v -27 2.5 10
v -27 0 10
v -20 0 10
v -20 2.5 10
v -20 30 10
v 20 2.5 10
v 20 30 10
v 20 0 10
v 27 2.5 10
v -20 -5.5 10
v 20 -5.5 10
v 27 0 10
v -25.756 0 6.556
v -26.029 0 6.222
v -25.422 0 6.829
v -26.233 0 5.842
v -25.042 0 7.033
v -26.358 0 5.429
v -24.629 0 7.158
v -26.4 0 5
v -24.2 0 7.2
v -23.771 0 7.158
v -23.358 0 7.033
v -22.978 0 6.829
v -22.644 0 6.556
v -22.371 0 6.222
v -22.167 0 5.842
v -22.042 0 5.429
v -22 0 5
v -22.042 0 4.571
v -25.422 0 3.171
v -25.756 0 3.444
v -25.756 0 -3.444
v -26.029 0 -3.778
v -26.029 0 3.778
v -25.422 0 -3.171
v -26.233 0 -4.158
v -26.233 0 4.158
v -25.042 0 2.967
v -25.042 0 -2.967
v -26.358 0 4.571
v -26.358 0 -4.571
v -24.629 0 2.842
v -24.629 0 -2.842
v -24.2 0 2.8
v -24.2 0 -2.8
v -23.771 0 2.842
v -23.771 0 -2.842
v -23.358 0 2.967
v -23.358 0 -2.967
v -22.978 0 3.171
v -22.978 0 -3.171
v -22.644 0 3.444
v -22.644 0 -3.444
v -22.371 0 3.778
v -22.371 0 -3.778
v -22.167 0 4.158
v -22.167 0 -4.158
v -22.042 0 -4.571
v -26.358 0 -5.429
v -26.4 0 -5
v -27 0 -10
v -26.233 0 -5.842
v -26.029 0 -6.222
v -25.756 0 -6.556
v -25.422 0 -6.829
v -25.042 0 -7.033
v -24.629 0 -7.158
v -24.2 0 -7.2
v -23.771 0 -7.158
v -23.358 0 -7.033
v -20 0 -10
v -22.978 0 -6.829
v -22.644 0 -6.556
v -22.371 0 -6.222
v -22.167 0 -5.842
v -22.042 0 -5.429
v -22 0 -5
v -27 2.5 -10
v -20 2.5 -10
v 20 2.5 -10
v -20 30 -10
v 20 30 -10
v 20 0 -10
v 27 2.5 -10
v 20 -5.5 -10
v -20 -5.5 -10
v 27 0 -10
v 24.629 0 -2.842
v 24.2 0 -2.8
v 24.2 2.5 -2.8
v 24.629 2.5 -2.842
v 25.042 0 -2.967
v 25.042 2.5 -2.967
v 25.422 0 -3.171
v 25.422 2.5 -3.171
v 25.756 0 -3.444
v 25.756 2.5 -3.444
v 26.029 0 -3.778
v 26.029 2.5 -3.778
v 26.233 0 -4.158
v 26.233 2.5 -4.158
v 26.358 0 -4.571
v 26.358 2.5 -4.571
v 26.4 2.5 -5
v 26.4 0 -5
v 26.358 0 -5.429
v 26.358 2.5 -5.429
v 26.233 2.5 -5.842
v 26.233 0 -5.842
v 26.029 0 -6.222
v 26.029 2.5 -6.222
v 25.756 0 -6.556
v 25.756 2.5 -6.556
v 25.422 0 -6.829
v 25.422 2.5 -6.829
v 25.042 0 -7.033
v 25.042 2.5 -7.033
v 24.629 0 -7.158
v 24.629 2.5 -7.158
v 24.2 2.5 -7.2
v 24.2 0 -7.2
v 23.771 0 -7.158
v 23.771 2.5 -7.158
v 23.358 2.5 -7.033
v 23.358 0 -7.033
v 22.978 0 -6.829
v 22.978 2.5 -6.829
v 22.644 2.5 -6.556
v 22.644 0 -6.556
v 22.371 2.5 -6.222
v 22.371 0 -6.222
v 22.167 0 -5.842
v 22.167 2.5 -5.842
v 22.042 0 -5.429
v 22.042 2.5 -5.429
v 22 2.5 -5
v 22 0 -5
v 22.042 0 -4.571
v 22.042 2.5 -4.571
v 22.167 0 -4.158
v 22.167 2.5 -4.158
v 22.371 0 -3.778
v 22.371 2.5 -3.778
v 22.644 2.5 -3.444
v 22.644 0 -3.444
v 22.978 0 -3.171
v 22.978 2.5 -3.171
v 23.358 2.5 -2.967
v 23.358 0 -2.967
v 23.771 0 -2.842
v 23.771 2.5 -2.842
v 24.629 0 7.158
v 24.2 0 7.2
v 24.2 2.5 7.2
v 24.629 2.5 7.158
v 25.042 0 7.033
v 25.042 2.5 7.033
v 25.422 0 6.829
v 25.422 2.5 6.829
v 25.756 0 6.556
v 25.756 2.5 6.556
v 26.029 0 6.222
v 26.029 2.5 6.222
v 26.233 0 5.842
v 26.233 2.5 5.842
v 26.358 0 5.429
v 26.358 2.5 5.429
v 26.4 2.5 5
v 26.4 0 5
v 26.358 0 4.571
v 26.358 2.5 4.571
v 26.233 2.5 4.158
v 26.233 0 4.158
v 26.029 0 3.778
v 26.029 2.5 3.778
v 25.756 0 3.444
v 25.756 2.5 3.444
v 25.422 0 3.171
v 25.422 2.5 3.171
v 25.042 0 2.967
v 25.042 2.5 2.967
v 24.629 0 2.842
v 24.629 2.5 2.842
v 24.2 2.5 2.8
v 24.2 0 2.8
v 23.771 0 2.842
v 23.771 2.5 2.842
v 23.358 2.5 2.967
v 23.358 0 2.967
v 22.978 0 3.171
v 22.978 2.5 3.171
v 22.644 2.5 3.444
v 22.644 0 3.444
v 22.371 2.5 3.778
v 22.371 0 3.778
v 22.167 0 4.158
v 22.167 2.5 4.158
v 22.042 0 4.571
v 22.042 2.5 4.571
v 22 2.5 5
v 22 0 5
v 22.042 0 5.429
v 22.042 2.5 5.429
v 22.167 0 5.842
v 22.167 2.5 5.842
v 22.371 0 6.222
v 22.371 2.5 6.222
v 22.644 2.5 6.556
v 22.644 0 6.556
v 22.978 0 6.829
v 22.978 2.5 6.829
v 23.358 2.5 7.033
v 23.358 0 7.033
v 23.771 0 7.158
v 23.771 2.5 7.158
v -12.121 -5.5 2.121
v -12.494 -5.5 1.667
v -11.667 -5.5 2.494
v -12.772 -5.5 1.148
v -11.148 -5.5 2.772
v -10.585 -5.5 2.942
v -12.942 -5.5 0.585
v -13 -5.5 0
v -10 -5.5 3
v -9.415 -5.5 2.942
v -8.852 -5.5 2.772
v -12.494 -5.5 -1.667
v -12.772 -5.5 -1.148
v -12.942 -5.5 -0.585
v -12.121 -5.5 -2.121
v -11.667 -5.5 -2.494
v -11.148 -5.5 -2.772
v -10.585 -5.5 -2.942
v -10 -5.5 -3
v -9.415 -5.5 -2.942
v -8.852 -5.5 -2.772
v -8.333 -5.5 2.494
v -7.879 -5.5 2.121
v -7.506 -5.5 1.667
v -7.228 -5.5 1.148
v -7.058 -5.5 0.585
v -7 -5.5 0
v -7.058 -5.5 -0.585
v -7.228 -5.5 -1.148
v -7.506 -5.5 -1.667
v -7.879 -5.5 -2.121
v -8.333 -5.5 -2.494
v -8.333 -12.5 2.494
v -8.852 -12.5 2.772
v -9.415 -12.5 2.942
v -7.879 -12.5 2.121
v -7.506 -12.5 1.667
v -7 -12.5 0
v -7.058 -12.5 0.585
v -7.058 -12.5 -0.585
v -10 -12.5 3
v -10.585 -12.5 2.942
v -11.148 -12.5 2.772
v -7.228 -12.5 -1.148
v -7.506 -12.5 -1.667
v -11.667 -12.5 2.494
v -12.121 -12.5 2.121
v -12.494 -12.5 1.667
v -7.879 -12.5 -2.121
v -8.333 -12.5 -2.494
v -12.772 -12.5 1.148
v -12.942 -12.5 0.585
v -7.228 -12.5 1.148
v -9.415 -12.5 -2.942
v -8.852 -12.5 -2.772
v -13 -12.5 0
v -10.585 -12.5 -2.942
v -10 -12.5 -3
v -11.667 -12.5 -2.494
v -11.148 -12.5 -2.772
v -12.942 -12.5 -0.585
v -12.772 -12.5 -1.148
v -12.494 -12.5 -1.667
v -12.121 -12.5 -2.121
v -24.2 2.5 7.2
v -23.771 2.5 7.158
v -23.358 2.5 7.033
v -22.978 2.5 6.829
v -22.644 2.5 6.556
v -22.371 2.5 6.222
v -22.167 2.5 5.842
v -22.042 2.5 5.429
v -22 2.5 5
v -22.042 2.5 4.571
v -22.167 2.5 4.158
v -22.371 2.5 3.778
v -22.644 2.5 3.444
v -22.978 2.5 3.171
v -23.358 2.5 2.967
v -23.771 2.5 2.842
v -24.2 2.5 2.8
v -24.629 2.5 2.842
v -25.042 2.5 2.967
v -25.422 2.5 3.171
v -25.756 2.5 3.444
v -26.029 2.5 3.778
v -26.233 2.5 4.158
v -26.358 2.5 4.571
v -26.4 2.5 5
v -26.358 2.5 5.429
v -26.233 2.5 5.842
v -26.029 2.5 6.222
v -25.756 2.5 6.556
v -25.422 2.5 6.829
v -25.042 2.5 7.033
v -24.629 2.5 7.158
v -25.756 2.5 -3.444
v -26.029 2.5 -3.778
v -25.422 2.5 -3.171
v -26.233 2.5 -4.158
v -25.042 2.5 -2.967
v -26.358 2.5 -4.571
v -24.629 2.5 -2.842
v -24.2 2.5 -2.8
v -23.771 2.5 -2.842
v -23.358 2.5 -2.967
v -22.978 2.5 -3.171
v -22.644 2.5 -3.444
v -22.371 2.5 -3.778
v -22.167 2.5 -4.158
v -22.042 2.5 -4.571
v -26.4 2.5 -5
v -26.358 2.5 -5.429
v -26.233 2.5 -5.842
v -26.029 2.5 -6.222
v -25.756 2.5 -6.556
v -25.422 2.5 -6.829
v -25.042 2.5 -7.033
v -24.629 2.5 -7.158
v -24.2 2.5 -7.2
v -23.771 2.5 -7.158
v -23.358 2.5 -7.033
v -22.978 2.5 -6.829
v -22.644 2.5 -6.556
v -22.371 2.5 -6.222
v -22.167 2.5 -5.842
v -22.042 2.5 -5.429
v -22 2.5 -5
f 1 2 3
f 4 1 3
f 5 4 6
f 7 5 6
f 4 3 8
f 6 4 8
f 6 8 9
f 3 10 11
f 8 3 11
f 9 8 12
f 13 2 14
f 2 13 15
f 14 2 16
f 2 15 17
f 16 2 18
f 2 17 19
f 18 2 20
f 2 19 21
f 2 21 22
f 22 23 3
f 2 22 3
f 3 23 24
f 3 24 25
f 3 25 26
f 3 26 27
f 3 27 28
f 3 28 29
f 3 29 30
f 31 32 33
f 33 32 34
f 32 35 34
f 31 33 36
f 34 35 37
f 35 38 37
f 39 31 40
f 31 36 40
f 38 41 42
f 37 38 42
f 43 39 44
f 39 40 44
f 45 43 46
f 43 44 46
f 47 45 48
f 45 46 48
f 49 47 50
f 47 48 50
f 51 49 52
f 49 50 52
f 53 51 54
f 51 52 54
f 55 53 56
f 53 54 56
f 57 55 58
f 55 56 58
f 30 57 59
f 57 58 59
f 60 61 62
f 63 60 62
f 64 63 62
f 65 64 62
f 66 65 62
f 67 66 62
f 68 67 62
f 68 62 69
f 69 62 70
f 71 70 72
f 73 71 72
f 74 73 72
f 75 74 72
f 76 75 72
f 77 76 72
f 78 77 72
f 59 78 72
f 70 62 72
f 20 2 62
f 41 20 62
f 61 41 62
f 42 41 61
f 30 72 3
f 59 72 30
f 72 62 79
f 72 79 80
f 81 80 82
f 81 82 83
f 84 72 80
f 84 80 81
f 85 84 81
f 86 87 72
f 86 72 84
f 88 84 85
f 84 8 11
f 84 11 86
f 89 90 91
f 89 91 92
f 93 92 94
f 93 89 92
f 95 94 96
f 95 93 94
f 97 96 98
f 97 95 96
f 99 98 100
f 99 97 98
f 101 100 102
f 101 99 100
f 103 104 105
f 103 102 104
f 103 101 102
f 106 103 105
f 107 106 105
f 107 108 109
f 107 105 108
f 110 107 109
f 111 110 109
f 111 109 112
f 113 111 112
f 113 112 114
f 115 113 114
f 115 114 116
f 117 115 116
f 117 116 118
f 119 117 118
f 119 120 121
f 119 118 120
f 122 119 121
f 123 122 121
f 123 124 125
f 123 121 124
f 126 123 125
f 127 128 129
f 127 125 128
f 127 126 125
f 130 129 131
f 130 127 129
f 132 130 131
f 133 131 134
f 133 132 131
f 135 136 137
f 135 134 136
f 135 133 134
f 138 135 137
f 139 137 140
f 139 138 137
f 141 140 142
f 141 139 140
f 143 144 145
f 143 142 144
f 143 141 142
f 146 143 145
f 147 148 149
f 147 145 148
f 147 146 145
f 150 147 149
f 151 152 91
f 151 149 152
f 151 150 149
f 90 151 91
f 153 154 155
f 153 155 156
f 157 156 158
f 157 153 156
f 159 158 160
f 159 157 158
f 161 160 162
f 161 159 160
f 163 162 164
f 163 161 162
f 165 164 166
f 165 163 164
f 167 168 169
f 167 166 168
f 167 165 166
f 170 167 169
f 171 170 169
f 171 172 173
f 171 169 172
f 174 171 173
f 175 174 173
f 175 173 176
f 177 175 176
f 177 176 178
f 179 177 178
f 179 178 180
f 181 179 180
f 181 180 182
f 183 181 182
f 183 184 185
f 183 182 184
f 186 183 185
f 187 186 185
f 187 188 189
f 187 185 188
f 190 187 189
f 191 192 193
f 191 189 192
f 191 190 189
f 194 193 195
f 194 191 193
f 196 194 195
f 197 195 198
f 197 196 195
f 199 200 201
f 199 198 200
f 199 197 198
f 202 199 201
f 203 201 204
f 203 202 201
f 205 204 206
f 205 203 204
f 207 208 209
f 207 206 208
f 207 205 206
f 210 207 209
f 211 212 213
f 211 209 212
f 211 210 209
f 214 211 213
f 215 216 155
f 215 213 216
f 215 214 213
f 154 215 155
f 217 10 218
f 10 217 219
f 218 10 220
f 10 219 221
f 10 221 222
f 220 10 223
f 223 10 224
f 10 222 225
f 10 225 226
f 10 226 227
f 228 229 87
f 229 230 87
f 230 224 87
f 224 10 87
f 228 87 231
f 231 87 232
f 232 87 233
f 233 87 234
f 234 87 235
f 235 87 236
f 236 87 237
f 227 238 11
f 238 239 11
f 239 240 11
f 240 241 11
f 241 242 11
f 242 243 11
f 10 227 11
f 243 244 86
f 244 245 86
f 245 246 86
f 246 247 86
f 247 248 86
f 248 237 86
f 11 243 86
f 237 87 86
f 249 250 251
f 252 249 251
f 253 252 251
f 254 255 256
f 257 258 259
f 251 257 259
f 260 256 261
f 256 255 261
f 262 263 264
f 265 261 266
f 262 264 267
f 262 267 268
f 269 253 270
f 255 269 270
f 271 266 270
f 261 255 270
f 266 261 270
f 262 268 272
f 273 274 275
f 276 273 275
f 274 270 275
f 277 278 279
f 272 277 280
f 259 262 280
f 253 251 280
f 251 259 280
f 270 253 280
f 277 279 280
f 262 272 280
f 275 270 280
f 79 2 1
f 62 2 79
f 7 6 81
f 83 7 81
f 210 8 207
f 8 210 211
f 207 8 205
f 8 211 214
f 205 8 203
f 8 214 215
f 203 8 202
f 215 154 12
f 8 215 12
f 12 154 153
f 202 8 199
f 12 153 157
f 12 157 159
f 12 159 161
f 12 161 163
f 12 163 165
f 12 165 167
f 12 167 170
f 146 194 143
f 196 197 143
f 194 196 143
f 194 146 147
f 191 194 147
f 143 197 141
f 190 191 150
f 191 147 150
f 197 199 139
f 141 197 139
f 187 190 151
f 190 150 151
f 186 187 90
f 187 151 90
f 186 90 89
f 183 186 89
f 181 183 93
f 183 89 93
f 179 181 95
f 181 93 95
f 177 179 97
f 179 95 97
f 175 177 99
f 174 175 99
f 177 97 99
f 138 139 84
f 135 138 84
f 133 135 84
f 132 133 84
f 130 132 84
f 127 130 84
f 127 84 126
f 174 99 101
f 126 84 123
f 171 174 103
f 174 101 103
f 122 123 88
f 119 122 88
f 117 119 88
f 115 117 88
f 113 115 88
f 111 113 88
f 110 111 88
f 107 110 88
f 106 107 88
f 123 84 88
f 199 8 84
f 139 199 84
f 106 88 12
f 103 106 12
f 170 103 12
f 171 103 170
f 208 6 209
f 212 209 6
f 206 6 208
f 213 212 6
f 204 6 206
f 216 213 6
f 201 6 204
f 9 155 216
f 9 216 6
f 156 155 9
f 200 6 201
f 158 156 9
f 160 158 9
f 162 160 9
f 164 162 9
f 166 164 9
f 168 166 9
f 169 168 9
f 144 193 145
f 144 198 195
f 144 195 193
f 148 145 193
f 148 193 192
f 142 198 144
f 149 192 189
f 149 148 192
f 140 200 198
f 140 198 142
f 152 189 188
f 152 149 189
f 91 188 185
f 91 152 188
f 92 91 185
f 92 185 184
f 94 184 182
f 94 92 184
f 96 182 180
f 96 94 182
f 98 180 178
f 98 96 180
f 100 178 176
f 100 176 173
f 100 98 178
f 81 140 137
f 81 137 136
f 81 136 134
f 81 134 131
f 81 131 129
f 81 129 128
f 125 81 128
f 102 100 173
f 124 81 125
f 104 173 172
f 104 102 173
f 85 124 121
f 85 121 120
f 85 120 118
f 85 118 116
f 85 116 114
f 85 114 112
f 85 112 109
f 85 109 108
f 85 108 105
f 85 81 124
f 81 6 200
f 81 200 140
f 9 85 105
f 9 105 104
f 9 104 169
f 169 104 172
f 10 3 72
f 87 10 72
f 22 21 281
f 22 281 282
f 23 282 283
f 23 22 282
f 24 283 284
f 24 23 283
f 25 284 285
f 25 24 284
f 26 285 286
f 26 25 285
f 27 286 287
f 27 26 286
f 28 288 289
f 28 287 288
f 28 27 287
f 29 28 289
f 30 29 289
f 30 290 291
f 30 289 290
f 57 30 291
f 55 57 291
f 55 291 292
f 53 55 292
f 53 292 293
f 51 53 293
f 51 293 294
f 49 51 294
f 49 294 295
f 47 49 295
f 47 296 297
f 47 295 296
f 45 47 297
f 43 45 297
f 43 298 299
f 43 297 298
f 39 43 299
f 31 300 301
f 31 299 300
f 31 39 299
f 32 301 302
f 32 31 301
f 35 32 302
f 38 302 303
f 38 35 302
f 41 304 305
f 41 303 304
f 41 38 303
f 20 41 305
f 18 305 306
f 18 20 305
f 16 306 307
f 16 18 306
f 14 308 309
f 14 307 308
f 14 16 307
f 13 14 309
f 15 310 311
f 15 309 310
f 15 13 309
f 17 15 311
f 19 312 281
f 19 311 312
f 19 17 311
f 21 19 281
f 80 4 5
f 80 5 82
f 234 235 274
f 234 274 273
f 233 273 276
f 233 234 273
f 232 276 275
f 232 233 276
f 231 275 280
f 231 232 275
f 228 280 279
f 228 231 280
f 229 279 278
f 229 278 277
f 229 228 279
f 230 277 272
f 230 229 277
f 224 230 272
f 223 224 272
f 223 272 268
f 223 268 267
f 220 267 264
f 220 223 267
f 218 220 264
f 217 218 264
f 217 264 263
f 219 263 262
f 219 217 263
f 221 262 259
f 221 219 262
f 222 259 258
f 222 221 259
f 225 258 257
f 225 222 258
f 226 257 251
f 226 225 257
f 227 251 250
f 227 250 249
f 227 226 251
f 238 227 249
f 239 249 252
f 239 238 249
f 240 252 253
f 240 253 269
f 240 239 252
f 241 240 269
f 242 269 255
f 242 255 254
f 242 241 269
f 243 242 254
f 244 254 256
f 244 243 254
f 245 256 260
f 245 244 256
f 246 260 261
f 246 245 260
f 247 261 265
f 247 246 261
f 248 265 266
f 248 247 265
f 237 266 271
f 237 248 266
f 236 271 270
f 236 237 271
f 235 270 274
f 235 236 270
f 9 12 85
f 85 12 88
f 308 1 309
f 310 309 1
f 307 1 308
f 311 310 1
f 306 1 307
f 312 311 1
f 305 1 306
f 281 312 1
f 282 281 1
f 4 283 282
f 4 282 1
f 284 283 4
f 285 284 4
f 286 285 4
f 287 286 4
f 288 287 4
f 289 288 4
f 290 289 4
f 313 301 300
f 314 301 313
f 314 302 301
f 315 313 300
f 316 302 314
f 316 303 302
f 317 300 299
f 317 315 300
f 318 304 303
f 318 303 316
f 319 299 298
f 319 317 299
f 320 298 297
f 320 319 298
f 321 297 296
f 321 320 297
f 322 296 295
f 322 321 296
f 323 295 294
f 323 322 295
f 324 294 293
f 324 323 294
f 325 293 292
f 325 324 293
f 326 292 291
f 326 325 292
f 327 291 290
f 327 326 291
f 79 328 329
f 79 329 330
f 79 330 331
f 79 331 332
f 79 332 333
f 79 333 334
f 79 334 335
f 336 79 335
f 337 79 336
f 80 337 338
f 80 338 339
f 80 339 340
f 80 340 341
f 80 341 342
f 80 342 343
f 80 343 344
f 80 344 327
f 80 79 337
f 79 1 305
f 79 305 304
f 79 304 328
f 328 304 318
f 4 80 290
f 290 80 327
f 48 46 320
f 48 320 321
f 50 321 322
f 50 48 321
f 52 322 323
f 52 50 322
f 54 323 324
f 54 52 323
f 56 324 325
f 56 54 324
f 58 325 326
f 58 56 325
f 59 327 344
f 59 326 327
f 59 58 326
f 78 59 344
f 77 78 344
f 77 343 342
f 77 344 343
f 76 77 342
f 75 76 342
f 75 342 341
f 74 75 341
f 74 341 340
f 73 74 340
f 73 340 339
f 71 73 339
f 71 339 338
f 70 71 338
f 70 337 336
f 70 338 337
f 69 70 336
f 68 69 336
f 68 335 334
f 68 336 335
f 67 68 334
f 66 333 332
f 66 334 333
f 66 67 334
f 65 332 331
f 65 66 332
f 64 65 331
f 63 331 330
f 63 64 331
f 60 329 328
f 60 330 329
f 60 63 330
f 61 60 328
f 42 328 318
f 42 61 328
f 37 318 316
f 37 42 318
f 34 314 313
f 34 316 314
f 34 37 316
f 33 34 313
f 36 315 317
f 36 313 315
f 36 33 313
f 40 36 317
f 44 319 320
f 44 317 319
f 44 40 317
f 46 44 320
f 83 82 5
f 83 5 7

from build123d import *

# Parameters (mm, degrees)
SKETCH_1_W               = 40
SKETCH_1_H               = 20
EXTRUDE_2_DEPTH          = 30
SKETCH_3_W               = 54
SKETCH_3_H               = 20
EXTRUDE_3_DEPTH          = 2.5
CUT_EXTRUDE_3_DEPTH      = 42.581245773
CUT_EXTRUDE_3_DEPTH_BACK = 42.581245773
SKETCH_4_R               = 2.2
SKETCH_5_W               = 40
SKETCH_5_H               = 20
EXTRUDE_4_DEPTH          = 5.5
EXTRUDE_START            = -5.5
SKETCH_6_R               = 3
EXTRUDE_5_DEPTH          = 7


with BuildPart() as part:
    # 草图1 → 凸台-拉伸2 (new body)
    with BuildSketch(Plane(origin=(0, 0, 0), x_dir=(1, 0, 0), z_dir=(0, 1, 0))):
        Rectangle(SKETCH_1_W, SKETCH_1_H)
    extrude(amount=EXTRUDE_2_DEPTH)

    # 草图3 → 凸台-拉伸3 (add)
    with BuildSketch(Plane(origin=(0, 0, 0), x_dir=(1, 0, 0), z_dir=(0, 1, 0))):
        Rectangle(SKETCH_3_W, SKETCH_3_H)
    extrude(amount=EXTRUDE_3_DEPTH)

    # 草图4 → 切除-拉伸3 (cut, two sides: drawn at the far end of the back side and taken through both)
    with BuildSketch(Plane(origin=(0, 0, 0), x_dir=(1, 0, 0), z_dir=(0, 1, 0)).offset(-CUT_EXTRUDE_3_DEPTH_BACK)):
        with Locations(Location((-24.2, -5, 0), (0, 0, 270))):
            Circle(SKETCH_4_R)
        with Locations(Location((-24.2, 5, 0), (0, 0, 270))):
            Circle(SKETCH_4_R)
        with Locations(Location((24.2, -5, 0), (0, 0, 270))):
            Circle(SKETCH_4_R)
        with Locations(Location((24.2, 5, 0), (0, 0, 270))):
            Circle(SKETCH_4_R)
    extrude(amount=CUT_EXTRUDE_3_DEPTH + CUT_EXTRUDE_3_DEPTH_BACK, mode=Mode.SUBTRACT)

    # 草图5 → 凸台-拉伸4 (add)
    with BuildSketch(Plane(origin=(0, 0, 0), x_dir=(1, 0, 0), z_dir=(0, 1, 0))):
        Rectangle(SKETCH_5_W, SKETCH_5_H)
    extrude(amount=-EXTRUDE_4_DEPTH)

    # 草图6 → 凸台-拉伸5 (add)
    with BuildSketch(Plane(origin=(0, 0, 0), x_dir=(1, 0, 0), z_dir=(0, 1, 0)).offset(EXTRUDE_START)):
        with Locations(Location((-10, 0, 0), (0, 0, 90))):
            Circle(SKETCH_6_R)
    extrude(amount=-EXTRUDE_5_DEPTH)


solid = part.part
